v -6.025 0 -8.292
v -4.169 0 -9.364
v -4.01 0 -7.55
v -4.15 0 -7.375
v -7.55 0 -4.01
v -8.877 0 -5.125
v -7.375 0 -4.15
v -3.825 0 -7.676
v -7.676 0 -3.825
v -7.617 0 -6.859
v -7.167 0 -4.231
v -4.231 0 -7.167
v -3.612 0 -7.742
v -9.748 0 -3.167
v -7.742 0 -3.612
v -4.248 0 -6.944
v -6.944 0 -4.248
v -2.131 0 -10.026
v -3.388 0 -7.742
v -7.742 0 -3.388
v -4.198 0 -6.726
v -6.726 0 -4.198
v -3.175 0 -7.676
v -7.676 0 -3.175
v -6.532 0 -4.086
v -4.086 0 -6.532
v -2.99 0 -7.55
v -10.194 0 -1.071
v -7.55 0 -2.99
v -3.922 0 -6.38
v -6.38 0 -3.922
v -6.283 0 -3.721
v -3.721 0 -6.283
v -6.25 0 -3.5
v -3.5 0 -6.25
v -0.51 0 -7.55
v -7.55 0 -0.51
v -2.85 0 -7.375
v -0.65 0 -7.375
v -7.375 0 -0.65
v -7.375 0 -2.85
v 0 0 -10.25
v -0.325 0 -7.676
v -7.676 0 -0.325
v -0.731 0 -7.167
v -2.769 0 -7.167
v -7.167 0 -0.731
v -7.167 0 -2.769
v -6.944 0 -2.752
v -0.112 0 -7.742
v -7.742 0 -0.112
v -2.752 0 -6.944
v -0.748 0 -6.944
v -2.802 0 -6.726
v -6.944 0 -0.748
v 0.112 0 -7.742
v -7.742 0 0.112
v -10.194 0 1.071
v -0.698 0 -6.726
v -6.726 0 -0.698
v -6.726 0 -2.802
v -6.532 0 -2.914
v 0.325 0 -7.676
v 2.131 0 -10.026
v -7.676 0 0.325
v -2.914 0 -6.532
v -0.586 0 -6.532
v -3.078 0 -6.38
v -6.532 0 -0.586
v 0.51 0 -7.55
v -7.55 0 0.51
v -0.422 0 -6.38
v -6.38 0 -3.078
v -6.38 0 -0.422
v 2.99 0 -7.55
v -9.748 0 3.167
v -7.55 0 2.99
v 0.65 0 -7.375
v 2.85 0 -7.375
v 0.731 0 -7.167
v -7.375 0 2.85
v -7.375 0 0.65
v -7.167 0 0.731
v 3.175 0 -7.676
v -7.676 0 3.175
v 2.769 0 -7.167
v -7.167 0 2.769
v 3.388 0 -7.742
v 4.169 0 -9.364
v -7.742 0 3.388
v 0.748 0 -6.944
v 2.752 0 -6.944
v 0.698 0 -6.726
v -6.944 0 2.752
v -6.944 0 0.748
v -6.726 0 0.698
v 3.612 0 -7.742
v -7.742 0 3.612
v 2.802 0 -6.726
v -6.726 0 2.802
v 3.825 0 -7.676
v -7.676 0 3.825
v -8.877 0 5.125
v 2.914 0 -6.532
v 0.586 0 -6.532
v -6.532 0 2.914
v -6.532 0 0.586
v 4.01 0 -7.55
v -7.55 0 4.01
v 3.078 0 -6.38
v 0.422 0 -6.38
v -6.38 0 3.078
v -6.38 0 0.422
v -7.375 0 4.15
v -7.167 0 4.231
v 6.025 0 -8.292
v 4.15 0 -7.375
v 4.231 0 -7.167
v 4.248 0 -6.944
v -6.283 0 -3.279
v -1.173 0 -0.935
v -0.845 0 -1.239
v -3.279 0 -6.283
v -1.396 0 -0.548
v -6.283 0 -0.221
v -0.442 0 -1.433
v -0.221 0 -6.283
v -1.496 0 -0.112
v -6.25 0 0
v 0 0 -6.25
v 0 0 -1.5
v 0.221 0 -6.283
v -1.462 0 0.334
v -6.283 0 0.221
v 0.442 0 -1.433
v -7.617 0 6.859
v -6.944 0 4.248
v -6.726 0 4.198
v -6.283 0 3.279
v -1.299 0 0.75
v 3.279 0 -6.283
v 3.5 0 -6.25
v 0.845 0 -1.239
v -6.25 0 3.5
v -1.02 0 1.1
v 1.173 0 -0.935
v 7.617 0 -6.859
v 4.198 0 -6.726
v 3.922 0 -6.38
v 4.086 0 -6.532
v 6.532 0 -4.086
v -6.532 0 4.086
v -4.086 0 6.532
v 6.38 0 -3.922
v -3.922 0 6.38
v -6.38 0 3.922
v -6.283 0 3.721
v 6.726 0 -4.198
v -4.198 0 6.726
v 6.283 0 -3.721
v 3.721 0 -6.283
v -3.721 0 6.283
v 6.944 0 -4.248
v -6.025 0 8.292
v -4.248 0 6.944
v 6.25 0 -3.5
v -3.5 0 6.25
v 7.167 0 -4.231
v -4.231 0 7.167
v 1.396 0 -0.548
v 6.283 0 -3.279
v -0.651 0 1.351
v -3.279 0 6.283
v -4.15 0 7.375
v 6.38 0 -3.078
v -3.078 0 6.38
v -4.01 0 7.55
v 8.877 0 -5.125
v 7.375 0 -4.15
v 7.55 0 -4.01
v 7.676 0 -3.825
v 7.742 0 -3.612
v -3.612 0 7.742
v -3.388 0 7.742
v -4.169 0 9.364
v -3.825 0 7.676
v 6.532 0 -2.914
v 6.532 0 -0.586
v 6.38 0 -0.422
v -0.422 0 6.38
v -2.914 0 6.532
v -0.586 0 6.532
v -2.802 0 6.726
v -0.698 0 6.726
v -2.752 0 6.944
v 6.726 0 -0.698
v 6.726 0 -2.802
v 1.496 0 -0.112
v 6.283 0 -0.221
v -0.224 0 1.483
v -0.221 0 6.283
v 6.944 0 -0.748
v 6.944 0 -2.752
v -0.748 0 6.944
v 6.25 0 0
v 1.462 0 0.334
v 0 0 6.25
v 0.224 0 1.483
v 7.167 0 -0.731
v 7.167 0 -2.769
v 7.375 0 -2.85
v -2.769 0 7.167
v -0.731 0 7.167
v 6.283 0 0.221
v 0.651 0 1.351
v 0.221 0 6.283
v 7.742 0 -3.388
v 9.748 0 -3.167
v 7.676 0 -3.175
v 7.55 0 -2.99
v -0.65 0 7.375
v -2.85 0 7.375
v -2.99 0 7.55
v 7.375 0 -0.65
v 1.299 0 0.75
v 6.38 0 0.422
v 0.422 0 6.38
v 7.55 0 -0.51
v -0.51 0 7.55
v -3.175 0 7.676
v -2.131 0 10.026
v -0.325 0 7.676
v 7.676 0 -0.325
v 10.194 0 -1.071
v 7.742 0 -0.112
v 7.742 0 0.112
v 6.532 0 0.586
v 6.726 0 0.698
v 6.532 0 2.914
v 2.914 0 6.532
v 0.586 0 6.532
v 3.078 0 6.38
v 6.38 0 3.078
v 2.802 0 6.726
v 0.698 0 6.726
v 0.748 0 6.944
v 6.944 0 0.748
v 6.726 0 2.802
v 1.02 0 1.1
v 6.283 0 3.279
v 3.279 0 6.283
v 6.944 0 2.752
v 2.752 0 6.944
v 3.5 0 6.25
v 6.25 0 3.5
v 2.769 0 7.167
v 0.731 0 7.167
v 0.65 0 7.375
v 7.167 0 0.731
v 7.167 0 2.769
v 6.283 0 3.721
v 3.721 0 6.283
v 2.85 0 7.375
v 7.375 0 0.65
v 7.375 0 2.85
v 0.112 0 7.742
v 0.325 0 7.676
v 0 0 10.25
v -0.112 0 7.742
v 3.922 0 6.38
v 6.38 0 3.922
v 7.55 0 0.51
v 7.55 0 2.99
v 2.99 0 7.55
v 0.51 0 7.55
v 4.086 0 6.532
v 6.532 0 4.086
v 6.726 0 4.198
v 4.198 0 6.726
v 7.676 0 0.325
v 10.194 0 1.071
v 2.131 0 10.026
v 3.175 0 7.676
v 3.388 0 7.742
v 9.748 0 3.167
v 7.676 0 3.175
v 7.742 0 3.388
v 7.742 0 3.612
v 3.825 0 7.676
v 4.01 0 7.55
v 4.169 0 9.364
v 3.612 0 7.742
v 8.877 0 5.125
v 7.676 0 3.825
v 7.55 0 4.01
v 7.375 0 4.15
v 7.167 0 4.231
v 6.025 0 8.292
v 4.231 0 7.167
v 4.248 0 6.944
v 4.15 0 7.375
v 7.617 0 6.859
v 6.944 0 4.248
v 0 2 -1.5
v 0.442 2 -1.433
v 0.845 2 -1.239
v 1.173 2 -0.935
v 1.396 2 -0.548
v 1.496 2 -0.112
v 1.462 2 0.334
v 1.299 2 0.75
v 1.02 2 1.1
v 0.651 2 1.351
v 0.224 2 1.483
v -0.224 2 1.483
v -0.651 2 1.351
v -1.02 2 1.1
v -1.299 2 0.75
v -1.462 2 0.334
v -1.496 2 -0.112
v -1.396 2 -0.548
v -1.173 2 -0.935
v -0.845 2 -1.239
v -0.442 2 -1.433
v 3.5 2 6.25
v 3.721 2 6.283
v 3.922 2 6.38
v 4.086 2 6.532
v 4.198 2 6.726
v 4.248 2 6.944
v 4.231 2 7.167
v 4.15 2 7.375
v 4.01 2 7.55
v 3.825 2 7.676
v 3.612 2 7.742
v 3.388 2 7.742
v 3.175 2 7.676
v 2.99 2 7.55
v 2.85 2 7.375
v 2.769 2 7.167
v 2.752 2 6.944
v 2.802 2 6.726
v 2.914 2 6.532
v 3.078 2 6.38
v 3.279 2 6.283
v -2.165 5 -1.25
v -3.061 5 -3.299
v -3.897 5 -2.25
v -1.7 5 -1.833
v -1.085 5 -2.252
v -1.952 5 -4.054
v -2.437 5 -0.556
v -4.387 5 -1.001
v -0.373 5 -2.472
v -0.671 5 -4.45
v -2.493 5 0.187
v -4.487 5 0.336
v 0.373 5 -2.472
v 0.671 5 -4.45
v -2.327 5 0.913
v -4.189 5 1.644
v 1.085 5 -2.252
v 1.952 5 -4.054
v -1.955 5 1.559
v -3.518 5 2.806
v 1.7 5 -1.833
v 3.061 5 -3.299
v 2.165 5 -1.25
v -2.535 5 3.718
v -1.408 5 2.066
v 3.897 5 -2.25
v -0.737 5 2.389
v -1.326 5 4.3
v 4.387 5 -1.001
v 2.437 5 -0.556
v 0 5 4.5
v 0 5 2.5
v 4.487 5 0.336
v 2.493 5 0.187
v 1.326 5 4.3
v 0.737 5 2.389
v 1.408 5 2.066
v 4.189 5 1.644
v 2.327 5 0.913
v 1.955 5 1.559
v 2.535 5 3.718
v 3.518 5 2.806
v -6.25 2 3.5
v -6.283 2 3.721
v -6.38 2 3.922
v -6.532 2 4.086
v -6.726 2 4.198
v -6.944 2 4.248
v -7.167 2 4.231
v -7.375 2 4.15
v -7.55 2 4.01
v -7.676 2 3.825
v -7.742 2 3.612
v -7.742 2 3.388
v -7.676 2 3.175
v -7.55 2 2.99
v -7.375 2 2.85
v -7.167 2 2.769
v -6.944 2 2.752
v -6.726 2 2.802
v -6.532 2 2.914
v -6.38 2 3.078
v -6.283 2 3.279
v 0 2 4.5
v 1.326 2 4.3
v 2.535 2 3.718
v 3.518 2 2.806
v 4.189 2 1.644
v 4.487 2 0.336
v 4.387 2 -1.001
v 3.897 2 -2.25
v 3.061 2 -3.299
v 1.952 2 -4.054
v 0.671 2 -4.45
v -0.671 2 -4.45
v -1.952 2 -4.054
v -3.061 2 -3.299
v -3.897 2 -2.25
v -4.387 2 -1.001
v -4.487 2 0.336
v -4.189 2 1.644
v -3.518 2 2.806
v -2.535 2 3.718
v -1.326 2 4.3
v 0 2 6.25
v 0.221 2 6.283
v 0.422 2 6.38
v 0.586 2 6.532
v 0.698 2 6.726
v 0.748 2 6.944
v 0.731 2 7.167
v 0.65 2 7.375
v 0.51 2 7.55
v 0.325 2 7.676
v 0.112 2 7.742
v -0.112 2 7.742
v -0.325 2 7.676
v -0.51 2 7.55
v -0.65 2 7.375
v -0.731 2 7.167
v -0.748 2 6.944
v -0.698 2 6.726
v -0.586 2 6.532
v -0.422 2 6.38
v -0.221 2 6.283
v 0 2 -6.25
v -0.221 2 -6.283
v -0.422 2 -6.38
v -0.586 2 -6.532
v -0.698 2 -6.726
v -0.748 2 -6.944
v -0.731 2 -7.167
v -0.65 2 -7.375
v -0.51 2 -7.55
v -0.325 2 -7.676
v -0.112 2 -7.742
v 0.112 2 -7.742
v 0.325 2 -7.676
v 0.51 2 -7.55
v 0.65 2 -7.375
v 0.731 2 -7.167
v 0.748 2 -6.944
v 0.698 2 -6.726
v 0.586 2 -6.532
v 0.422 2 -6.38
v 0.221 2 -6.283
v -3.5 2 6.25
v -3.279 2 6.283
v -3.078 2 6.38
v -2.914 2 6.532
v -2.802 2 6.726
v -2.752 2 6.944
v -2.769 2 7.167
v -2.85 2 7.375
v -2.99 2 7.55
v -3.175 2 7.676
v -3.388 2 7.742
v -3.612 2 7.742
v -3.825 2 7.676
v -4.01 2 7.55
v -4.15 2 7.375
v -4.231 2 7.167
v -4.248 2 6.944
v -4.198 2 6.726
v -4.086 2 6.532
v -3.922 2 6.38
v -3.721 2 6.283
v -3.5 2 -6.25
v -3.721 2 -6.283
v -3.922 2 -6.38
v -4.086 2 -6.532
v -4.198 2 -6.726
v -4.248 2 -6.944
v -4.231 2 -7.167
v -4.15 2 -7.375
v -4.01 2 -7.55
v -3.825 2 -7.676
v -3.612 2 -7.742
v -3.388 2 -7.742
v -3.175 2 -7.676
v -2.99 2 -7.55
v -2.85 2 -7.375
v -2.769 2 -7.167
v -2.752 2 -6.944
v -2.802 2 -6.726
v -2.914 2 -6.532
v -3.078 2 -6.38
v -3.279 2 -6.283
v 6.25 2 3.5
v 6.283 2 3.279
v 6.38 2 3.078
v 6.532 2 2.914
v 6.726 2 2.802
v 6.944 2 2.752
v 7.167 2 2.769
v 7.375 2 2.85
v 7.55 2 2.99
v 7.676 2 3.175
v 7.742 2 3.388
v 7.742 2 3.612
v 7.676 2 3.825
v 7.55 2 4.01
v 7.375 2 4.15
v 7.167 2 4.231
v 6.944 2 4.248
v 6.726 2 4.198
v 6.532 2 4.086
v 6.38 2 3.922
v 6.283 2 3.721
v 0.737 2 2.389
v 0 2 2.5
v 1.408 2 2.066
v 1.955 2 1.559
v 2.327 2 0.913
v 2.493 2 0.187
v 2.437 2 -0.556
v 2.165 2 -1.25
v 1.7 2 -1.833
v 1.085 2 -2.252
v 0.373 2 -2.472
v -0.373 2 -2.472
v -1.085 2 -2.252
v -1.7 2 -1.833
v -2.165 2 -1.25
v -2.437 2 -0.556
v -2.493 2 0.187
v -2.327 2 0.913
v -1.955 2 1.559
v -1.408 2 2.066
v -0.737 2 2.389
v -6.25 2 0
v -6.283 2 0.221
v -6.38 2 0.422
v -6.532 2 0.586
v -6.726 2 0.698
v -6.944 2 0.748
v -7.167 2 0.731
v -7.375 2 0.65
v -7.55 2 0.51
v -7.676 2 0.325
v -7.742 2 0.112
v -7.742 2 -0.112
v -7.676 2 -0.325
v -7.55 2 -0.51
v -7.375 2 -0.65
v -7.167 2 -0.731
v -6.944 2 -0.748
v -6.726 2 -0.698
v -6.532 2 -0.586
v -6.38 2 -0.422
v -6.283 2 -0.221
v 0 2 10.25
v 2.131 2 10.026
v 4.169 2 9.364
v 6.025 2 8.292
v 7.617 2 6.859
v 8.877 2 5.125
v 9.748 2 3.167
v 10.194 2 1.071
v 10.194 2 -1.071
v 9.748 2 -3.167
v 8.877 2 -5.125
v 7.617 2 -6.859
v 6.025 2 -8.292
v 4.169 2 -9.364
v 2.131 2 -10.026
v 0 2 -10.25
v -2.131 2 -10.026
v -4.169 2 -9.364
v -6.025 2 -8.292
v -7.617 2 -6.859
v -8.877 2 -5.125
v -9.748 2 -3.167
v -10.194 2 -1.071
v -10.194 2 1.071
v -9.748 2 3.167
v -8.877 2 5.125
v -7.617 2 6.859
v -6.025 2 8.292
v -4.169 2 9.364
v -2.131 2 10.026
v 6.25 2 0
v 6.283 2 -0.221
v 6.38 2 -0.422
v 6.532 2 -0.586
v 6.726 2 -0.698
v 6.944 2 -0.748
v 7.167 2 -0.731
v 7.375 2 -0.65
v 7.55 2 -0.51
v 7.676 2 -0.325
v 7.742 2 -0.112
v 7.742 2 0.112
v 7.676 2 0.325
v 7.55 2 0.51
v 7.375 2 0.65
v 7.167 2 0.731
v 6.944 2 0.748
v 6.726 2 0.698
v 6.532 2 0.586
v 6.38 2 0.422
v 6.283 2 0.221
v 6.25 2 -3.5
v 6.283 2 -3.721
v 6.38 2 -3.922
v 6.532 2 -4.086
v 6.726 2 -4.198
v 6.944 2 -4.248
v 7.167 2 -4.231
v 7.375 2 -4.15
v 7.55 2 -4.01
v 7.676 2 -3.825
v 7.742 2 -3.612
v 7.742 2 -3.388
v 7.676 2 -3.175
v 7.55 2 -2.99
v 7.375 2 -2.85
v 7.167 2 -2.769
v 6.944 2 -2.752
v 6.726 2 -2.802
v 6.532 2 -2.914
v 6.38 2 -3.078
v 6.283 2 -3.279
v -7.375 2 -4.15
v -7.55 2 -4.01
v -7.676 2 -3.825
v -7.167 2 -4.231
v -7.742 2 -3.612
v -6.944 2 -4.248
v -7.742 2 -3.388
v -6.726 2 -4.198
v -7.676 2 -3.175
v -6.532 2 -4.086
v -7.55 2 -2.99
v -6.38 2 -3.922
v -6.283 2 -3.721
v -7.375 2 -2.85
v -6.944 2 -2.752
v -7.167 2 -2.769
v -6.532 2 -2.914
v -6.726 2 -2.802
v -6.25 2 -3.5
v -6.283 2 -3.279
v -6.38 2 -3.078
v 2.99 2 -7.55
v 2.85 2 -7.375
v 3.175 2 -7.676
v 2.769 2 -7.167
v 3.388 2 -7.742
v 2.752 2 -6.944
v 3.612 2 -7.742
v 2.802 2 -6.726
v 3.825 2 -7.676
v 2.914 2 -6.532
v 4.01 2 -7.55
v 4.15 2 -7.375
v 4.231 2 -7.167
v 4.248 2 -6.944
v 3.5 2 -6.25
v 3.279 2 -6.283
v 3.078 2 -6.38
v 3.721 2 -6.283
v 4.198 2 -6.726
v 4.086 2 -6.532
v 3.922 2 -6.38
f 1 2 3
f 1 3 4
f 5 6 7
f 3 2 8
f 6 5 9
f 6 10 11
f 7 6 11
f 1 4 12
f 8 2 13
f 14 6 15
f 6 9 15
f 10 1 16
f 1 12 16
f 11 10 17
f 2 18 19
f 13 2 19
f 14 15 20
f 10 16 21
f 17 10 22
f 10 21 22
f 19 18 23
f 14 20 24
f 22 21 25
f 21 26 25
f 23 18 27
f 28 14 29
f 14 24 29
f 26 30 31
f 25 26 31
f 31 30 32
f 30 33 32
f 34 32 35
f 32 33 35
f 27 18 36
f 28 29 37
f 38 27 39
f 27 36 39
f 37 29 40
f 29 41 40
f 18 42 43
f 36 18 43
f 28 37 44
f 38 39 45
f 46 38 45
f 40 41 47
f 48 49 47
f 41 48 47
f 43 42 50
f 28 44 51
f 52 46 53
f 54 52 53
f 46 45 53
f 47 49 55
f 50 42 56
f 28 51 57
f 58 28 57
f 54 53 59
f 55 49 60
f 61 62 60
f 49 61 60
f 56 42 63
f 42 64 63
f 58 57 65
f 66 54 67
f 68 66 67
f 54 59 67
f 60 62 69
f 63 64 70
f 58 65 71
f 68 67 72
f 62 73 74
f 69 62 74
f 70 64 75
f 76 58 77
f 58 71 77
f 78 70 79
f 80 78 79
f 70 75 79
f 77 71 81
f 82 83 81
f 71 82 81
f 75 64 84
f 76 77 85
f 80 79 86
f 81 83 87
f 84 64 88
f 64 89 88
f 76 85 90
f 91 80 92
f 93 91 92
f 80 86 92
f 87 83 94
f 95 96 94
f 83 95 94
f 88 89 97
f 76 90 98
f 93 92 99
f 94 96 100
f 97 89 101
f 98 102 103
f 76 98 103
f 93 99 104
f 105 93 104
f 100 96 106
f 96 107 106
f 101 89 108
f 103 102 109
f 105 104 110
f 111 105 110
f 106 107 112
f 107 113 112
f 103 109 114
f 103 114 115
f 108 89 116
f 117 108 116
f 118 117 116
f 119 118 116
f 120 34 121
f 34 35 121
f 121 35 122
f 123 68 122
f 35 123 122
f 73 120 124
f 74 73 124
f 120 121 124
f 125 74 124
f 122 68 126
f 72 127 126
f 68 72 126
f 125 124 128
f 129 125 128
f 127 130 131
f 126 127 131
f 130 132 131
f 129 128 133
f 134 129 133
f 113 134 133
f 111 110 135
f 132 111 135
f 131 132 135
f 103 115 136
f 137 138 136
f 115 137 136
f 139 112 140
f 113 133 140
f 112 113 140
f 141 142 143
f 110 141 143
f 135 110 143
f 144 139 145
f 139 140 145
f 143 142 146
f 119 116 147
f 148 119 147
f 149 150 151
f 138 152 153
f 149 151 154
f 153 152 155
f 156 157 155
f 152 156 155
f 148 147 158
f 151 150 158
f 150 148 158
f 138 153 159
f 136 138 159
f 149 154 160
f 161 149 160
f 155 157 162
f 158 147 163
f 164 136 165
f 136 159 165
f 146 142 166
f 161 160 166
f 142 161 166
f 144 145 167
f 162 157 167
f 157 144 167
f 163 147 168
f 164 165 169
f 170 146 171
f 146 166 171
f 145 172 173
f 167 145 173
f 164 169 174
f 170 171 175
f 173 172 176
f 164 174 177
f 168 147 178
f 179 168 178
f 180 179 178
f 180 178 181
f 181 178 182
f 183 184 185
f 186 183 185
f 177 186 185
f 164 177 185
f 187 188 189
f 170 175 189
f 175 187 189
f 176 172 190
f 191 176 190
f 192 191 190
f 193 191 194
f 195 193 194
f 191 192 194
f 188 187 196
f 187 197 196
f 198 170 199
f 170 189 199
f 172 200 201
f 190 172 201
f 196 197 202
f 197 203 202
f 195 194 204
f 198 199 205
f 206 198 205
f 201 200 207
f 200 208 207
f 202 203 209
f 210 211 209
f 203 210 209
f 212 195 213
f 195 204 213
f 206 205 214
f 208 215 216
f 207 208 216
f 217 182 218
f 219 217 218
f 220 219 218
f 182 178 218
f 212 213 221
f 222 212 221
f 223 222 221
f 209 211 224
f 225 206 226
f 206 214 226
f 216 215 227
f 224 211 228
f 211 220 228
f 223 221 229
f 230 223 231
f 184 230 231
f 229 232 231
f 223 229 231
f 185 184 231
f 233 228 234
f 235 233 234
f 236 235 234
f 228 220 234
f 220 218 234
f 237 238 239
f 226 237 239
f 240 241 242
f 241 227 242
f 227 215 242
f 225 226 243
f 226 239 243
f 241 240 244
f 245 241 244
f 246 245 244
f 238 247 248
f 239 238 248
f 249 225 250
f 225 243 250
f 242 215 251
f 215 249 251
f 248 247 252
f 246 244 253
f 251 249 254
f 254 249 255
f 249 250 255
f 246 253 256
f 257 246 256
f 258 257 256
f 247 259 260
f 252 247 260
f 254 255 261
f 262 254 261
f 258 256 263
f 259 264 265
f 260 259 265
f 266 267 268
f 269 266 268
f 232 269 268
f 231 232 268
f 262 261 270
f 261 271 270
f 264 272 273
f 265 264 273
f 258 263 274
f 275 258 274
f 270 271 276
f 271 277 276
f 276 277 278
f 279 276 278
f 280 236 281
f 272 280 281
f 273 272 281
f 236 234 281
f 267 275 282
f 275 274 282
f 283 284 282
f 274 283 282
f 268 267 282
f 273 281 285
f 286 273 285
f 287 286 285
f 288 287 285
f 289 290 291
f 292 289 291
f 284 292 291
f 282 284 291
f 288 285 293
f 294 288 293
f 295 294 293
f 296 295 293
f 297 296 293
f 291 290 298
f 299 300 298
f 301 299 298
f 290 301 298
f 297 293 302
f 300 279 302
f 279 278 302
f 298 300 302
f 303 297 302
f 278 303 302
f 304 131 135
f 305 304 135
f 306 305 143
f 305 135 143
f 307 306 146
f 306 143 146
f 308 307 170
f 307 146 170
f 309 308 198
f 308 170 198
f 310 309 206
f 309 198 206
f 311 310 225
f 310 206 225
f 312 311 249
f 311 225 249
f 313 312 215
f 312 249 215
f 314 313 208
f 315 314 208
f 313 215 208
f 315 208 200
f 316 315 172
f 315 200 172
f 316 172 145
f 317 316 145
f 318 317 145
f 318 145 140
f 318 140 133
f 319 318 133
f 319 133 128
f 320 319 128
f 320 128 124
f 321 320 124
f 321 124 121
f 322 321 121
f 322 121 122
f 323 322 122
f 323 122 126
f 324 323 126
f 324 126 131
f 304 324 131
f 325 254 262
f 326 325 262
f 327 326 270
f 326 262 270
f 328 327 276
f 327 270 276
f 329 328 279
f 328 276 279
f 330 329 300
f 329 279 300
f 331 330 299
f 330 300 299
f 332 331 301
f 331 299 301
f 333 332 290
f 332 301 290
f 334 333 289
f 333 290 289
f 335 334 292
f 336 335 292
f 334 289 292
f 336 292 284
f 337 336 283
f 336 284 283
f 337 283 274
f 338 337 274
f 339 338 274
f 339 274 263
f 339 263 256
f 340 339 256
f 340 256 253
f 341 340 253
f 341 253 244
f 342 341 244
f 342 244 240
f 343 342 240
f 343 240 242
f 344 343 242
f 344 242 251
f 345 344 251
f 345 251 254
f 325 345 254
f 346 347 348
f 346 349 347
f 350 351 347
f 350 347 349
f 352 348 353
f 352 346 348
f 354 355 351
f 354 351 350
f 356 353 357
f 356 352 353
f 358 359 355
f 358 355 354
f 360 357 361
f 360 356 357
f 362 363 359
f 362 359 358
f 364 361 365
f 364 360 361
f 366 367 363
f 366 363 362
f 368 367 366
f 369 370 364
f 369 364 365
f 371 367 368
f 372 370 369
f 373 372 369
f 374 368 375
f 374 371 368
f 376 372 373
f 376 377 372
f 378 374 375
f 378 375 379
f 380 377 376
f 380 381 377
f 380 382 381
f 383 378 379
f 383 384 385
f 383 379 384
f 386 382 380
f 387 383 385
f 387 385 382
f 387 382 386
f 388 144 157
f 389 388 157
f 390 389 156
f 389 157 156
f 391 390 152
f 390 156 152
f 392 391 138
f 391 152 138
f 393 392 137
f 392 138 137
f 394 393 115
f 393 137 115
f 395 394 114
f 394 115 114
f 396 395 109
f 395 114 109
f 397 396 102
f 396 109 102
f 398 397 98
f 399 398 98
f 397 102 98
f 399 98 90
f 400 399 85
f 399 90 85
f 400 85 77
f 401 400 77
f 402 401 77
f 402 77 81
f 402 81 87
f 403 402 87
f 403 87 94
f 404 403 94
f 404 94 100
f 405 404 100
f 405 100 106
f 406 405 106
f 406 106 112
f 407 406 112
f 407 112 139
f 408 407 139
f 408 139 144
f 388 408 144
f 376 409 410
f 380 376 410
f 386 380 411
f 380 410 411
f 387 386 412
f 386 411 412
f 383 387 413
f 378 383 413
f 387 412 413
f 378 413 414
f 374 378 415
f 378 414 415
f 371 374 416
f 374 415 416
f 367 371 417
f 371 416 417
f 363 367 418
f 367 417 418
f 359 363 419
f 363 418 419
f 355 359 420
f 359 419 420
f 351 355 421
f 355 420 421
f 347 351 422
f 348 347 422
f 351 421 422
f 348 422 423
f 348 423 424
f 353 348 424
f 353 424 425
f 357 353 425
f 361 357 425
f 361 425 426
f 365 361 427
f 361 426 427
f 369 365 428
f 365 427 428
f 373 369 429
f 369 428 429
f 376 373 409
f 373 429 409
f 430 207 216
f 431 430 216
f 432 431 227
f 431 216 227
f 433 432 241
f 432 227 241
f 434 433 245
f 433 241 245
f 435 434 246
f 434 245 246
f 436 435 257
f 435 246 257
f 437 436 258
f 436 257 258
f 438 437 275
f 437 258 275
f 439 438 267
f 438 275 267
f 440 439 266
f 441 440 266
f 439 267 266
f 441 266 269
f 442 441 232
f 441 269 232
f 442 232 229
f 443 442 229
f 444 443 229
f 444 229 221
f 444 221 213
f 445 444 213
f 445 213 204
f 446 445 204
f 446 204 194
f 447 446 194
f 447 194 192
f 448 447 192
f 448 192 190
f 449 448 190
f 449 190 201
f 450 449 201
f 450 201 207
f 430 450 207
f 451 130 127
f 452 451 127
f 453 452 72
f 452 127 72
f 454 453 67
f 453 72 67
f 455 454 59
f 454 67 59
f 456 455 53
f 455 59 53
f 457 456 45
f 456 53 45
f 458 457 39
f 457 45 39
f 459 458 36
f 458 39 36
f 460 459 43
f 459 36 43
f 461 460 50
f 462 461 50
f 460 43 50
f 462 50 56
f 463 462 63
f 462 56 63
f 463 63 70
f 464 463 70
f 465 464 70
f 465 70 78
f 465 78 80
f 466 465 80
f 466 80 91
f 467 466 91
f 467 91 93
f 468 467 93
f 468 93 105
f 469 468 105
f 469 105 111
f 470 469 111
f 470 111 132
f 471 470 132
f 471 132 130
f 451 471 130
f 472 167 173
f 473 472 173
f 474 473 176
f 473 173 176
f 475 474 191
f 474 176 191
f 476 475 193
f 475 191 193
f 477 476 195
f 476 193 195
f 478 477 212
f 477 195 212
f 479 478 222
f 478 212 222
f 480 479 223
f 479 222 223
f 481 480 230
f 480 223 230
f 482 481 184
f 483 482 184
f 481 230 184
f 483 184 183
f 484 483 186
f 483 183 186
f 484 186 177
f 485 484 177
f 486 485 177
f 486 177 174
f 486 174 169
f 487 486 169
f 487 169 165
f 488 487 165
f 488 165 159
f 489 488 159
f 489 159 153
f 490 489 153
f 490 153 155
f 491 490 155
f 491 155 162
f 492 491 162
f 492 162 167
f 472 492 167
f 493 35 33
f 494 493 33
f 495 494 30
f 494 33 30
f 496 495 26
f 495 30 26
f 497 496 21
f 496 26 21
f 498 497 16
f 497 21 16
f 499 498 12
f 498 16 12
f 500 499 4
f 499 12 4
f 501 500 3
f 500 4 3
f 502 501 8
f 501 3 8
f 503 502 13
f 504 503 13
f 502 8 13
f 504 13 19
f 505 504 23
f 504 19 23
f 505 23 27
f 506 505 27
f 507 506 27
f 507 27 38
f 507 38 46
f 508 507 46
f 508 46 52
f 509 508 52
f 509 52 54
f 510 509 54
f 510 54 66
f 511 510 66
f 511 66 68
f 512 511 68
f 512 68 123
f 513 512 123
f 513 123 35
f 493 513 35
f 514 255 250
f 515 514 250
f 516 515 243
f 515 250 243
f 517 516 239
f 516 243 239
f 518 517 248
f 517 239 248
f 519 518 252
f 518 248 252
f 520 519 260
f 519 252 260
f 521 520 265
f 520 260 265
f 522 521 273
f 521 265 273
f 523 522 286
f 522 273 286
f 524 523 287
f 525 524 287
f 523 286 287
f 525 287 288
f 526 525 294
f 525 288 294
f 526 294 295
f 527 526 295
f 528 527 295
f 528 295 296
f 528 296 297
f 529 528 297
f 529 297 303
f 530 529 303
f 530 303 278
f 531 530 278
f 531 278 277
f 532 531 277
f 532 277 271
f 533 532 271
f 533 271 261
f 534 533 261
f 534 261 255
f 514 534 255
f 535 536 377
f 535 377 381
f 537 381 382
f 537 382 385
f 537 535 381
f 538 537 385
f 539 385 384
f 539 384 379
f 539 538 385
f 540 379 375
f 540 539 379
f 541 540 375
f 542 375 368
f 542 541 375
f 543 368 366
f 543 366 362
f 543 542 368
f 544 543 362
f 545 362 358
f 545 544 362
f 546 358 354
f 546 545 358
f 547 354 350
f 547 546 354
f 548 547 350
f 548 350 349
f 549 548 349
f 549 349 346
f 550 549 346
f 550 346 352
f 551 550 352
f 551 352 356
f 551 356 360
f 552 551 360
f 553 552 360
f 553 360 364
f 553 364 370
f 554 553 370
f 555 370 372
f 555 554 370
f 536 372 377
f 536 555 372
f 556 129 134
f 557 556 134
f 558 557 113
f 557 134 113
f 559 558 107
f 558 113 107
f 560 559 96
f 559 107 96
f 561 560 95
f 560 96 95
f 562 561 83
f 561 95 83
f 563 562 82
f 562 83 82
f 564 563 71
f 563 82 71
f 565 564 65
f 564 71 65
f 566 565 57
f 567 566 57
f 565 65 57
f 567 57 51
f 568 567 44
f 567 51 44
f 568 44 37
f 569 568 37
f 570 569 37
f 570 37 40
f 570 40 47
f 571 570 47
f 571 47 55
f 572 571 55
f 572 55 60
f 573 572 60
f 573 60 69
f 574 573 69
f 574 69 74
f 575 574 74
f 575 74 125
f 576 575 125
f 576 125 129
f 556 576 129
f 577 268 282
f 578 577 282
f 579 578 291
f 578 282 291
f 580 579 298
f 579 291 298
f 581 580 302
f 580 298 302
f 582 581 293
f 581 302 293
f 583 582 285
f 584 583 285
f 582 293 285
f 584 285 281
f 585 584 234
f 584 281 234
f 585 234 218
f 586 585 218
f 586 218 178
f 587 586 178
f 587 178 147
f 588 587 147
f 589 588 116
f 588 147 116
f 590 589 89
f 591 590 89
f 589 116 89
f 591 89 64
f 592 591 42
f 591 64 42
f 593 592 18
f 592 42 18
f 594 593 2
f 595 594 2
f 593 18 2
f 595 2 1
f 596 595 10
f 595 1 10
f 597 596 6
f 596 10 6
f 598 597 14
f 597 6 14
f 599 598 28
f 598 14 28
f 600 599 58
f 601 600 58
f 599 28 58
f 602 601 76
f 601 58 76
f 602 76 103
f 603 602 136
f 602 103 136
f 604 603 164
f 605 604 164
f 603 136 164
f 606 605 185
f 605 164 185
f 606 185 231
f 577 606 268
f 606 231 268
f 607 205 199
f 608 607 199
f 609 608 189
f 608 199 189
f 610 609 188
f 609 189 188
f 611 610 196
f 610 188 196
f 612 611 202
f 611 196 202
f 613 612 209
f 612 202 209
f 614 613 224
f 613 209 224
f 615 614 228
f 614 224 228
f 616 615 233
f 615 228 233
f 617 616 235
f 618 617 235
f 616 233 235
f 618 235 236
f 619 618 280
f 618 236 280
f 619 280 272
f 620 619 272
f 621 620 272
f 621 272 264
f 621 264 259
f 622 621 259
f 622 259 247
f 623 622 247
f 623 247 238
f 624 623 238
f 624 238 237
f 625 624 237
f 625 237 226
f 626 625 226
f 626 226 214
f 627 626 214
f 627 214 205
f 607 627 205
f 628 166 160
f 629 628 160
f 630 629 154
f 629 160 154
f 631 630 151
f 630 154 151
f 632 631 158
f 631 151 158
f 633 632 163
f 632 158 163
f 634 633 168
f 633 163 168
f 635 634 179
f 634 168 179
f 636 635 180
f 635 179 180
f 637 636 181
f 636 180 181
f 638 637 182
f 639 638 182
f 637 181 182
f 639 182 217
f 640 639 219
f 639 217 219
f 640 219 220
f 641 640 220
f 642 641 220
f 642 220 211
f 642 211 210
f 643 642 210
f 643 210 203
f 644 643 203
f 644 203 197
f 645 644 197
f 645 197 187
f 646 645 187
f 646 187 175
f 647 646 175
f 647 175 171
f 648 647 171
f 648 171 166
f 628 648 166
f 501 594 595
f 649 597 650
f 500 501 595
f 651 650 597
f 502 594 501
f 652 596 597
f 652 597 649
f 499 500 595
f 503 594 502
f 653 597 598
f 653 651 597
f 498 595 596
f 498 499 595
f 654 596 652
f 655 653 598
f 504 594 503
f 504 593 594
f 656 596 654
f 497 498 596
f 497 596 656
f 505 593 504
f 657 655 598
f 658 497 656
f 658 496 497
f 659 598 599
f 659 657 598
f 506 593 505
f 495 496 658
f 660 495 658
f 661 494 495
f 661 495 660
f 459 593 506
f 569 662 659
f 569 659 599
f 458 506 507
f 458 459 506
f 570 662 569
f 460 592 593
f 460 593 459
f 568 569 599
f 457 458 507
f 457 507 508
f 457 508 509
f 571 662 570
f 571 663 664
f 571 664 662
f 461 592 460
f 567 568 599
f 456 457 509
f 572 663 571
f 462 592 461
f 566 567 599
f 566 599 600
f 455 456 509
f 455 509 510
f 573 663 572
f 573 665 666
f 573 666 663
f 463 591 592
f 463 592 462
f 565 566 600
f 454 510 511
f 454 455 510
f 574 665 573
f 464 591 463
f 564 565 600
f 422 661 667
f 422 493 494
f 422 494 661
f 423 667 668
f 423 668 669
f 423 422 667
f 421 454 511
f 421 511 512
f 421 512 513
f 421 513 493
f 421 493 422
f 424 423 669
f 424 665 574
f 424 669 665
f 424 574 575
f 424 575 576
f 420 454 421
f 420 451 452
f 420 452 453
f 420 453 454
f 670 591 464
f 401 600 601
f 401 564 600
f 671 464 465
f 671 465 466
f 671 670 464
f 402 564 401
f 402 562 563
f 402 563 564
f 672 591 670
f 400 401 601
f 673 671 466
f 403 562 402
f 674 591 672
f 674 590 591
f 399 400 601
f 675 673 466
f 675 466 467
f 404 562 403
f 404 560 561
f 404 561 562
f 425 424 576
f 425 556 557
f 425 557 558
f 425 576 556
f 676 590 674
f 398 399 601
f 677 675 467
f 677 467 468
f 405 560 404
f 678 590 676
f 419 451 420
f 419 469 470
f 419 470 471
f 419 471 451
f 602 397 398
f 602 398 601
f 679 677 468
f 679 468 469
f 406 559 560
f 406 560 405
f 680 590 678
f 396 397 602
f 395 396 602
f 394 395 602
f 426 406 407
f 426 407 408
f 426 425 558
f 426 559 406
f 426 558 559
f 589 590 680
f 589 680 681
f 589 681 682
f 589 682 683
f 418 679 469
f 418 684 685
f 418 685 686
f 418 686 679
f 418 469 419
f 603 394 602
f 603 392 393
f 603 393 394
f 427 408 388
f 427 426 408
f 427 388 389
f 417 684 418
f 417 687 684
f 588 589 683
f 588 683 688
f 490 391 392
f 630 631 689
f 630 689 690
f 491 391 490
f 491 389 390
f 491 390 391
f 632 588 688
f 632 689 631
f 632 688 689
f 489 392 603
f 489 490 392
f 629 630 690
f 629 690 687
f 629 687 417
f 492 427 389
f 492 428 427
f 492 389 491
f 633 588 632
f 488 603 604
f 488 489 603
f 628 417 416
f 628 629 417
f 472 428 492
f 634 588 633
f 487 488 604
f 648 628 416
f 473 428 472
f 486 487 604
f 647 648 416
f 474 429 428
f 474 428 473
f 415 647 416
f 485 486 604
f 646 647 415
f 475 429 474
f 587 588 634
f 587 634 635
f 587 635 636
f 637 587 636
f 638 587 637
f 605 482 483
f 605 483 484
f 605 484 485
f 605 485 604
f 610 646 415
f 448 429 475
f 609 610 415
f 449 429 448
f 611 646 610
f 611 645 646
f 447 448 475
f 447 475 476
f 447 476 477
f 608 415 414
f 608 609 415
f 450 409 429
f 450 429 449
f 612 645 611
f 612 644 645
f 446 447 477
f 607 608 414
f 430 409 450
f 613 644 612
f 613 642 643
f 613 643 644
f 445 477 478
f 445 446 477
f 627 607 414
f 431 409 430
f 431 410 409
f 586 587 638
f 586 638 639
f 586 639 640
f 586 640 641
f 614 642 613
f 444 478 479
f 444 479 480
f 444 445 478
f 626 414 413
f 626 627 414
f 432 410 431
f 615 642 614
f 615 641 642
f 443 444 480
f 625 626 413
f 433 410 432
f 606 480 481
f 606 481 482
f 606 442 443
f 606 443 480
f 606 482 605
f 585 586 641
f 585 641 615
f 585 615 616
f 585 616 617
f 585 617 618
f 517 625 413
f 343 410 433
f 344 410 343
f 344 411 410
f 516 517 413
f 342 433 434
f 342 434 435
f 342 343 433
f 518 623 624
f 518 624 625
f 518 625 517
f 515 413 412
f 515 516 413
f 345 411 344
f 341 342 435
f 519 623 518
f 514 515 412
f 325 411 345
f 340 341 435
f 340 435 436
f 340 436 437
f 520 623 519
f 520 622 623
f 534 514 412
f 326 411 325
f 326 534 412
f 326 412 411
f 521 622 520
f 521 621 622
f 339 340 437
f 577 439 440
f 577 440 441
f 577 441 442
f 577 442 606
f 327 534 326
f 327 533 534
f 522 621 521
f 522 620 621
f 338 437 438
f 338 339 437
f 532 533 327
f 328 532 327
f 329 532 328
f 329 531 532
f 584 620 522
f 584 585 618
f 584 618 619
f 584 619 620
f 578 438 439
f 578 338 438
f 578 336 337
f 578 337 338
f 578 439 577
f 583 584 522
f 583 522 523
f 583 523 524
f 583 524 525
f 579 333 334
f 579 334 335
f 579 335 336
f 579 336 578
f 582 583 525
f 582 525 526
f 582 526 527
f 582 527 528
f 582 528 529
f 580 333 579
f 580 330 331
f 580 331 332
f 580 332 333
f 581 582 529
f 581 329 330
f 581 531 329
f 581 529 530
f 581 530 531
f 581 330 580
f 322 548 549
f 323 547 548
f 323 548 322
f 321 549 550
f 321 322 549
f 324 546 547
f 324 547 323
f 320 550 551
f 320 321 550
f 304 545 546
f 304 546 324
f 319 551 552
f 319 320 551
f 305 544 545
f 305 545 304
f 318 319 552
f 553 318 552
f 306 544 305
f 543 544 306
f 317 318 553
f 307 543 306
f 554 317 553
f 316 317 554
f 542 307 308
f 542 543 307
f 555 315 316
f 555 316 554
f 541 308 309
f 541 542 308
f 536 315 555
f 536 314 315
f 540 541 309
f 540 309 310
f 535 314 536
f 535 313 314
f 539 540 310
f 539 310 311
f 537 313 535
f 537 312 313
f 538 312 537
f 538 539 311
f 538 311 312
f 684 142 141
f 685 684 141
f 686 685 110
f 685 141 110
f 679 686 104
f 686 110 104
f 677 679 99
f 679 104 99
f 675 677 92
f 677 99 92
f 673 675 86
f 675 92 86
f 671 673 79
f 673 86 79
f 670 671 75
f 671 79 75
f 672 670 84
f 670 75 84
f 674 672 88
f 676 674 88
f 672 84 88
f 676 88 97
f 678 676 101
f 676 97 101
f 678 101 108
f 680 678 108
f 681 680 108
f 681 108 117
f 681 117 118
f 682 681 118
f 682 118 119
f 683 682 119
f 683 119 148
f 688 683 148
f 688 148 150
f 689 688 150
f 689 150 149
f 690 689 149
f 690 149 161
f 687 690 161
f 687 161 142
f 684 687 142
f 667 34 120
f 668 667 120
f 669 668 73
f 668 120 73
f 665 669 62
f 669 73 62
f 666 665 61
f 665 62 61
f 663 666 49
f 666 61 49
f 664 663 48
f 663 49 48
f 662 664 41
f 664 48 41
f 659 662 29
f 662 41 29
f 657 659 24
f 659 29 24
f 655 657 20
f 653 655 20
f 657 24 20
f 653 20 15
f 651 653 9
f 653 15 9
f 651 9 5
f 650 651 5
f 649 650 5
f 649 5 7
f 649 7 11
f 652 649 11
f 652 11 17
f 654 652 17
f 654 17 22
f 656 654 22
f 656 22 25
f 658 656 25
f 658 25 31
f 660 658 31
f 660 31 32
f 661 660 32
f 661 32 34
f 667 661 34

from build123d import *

# Parameters (mm, degrees)
SKETCH1_R           = 10.25
BOSS_EXTRUDE1_DEPTH = 2
SKETCH2_R           = 4.5
SKETCH2_R_2         = 2.5
BOSS_EXTRUDE2_DEPTH = 3
SKETCH3_R           = 1.5
CUT_EXTRUDE1_DEPTH  = 16.333786225
SKETCH4_R           = 0.75
CUT_EXTRUDE2_DEPTH  = 16.333786225
CIRPATTERN1_COUNT   = 4


with BuildPart() as part:
    # Sketch1 → Boss-Extrude1 (new body)
    with BuildSketch(Plane(origin=(0, 0, 0), x_dir=(1, 0, 0), z_dir=(0, 1, 0))):
        with Locations(Location((0, 0, 0), (0, 0, 270))):
            Circle(SKETCH1_R)
    extrude(amount=BOSS_EXTRUDE1_DEPTH)

    # Sketch2 → Boss-Extrude2 (add)
    with BuildSketch(Plane(origin=(0, 2, 0), x_dir=(1, 0, 0), z_dir=(0, 1, 0))):
        with Locations(Location((0, 0, 0), (0, 0, 270))):
            Circle(SKETCH2_R)
        with Locations(Location((0, 0, 0), (0, 0, 270))):
            Circle(SKETCH2_R_2, mode=Mode.SUBTRACT)
    extrude(amount=BOSS_EXTRUDE2_DEPTH)

    # Sketch3 → Cut-Extrude1 (cut, through all)
    with BuildSketch(Plane.XZ):
        with Locations(Location((0, 0, 0), (0, 0, 270))):
            Circle(SKETCH3_R)
    extrude(amount=-CUT_EXTRUDE1_DEPTH, mode=Mode.SUBTRACT)

    # Sketch4 → Cut-Extrude2 (cut, through all)
    with BuildSketch(Plane.XZ):
        with Locations(Location((0, 7, 0), (0, 0, 270))):
            Circle(SKETCH4_R)
        with Locations(Location((-3.5, 7, 0), (0, 0, 270))):
            Circle(SKETCH4_R)
        with Locations(Location((3.5, 7, 0), (0, 0, 270))):
            Circle(SKETCH4_R)
    cut_extrude2 = extrude(amount=-CUT_EXTRUDE2_DEPTH, mode=Mode.SUBTRACT)

    # CirPattern1: Cut-Extrude2 ×4 about axis
    cirpattern1_axis = Axis((0, 0, 0), (0, 1, 0))
    for i in range(1, CIRPATTERN1_COUNT):
        add(cut_extrude2.rotate(cirpattern1_axis, i * 360 / CIRPATTERN1_COUNT), mode=Mode.SUBTRACT)


solid = part.part
